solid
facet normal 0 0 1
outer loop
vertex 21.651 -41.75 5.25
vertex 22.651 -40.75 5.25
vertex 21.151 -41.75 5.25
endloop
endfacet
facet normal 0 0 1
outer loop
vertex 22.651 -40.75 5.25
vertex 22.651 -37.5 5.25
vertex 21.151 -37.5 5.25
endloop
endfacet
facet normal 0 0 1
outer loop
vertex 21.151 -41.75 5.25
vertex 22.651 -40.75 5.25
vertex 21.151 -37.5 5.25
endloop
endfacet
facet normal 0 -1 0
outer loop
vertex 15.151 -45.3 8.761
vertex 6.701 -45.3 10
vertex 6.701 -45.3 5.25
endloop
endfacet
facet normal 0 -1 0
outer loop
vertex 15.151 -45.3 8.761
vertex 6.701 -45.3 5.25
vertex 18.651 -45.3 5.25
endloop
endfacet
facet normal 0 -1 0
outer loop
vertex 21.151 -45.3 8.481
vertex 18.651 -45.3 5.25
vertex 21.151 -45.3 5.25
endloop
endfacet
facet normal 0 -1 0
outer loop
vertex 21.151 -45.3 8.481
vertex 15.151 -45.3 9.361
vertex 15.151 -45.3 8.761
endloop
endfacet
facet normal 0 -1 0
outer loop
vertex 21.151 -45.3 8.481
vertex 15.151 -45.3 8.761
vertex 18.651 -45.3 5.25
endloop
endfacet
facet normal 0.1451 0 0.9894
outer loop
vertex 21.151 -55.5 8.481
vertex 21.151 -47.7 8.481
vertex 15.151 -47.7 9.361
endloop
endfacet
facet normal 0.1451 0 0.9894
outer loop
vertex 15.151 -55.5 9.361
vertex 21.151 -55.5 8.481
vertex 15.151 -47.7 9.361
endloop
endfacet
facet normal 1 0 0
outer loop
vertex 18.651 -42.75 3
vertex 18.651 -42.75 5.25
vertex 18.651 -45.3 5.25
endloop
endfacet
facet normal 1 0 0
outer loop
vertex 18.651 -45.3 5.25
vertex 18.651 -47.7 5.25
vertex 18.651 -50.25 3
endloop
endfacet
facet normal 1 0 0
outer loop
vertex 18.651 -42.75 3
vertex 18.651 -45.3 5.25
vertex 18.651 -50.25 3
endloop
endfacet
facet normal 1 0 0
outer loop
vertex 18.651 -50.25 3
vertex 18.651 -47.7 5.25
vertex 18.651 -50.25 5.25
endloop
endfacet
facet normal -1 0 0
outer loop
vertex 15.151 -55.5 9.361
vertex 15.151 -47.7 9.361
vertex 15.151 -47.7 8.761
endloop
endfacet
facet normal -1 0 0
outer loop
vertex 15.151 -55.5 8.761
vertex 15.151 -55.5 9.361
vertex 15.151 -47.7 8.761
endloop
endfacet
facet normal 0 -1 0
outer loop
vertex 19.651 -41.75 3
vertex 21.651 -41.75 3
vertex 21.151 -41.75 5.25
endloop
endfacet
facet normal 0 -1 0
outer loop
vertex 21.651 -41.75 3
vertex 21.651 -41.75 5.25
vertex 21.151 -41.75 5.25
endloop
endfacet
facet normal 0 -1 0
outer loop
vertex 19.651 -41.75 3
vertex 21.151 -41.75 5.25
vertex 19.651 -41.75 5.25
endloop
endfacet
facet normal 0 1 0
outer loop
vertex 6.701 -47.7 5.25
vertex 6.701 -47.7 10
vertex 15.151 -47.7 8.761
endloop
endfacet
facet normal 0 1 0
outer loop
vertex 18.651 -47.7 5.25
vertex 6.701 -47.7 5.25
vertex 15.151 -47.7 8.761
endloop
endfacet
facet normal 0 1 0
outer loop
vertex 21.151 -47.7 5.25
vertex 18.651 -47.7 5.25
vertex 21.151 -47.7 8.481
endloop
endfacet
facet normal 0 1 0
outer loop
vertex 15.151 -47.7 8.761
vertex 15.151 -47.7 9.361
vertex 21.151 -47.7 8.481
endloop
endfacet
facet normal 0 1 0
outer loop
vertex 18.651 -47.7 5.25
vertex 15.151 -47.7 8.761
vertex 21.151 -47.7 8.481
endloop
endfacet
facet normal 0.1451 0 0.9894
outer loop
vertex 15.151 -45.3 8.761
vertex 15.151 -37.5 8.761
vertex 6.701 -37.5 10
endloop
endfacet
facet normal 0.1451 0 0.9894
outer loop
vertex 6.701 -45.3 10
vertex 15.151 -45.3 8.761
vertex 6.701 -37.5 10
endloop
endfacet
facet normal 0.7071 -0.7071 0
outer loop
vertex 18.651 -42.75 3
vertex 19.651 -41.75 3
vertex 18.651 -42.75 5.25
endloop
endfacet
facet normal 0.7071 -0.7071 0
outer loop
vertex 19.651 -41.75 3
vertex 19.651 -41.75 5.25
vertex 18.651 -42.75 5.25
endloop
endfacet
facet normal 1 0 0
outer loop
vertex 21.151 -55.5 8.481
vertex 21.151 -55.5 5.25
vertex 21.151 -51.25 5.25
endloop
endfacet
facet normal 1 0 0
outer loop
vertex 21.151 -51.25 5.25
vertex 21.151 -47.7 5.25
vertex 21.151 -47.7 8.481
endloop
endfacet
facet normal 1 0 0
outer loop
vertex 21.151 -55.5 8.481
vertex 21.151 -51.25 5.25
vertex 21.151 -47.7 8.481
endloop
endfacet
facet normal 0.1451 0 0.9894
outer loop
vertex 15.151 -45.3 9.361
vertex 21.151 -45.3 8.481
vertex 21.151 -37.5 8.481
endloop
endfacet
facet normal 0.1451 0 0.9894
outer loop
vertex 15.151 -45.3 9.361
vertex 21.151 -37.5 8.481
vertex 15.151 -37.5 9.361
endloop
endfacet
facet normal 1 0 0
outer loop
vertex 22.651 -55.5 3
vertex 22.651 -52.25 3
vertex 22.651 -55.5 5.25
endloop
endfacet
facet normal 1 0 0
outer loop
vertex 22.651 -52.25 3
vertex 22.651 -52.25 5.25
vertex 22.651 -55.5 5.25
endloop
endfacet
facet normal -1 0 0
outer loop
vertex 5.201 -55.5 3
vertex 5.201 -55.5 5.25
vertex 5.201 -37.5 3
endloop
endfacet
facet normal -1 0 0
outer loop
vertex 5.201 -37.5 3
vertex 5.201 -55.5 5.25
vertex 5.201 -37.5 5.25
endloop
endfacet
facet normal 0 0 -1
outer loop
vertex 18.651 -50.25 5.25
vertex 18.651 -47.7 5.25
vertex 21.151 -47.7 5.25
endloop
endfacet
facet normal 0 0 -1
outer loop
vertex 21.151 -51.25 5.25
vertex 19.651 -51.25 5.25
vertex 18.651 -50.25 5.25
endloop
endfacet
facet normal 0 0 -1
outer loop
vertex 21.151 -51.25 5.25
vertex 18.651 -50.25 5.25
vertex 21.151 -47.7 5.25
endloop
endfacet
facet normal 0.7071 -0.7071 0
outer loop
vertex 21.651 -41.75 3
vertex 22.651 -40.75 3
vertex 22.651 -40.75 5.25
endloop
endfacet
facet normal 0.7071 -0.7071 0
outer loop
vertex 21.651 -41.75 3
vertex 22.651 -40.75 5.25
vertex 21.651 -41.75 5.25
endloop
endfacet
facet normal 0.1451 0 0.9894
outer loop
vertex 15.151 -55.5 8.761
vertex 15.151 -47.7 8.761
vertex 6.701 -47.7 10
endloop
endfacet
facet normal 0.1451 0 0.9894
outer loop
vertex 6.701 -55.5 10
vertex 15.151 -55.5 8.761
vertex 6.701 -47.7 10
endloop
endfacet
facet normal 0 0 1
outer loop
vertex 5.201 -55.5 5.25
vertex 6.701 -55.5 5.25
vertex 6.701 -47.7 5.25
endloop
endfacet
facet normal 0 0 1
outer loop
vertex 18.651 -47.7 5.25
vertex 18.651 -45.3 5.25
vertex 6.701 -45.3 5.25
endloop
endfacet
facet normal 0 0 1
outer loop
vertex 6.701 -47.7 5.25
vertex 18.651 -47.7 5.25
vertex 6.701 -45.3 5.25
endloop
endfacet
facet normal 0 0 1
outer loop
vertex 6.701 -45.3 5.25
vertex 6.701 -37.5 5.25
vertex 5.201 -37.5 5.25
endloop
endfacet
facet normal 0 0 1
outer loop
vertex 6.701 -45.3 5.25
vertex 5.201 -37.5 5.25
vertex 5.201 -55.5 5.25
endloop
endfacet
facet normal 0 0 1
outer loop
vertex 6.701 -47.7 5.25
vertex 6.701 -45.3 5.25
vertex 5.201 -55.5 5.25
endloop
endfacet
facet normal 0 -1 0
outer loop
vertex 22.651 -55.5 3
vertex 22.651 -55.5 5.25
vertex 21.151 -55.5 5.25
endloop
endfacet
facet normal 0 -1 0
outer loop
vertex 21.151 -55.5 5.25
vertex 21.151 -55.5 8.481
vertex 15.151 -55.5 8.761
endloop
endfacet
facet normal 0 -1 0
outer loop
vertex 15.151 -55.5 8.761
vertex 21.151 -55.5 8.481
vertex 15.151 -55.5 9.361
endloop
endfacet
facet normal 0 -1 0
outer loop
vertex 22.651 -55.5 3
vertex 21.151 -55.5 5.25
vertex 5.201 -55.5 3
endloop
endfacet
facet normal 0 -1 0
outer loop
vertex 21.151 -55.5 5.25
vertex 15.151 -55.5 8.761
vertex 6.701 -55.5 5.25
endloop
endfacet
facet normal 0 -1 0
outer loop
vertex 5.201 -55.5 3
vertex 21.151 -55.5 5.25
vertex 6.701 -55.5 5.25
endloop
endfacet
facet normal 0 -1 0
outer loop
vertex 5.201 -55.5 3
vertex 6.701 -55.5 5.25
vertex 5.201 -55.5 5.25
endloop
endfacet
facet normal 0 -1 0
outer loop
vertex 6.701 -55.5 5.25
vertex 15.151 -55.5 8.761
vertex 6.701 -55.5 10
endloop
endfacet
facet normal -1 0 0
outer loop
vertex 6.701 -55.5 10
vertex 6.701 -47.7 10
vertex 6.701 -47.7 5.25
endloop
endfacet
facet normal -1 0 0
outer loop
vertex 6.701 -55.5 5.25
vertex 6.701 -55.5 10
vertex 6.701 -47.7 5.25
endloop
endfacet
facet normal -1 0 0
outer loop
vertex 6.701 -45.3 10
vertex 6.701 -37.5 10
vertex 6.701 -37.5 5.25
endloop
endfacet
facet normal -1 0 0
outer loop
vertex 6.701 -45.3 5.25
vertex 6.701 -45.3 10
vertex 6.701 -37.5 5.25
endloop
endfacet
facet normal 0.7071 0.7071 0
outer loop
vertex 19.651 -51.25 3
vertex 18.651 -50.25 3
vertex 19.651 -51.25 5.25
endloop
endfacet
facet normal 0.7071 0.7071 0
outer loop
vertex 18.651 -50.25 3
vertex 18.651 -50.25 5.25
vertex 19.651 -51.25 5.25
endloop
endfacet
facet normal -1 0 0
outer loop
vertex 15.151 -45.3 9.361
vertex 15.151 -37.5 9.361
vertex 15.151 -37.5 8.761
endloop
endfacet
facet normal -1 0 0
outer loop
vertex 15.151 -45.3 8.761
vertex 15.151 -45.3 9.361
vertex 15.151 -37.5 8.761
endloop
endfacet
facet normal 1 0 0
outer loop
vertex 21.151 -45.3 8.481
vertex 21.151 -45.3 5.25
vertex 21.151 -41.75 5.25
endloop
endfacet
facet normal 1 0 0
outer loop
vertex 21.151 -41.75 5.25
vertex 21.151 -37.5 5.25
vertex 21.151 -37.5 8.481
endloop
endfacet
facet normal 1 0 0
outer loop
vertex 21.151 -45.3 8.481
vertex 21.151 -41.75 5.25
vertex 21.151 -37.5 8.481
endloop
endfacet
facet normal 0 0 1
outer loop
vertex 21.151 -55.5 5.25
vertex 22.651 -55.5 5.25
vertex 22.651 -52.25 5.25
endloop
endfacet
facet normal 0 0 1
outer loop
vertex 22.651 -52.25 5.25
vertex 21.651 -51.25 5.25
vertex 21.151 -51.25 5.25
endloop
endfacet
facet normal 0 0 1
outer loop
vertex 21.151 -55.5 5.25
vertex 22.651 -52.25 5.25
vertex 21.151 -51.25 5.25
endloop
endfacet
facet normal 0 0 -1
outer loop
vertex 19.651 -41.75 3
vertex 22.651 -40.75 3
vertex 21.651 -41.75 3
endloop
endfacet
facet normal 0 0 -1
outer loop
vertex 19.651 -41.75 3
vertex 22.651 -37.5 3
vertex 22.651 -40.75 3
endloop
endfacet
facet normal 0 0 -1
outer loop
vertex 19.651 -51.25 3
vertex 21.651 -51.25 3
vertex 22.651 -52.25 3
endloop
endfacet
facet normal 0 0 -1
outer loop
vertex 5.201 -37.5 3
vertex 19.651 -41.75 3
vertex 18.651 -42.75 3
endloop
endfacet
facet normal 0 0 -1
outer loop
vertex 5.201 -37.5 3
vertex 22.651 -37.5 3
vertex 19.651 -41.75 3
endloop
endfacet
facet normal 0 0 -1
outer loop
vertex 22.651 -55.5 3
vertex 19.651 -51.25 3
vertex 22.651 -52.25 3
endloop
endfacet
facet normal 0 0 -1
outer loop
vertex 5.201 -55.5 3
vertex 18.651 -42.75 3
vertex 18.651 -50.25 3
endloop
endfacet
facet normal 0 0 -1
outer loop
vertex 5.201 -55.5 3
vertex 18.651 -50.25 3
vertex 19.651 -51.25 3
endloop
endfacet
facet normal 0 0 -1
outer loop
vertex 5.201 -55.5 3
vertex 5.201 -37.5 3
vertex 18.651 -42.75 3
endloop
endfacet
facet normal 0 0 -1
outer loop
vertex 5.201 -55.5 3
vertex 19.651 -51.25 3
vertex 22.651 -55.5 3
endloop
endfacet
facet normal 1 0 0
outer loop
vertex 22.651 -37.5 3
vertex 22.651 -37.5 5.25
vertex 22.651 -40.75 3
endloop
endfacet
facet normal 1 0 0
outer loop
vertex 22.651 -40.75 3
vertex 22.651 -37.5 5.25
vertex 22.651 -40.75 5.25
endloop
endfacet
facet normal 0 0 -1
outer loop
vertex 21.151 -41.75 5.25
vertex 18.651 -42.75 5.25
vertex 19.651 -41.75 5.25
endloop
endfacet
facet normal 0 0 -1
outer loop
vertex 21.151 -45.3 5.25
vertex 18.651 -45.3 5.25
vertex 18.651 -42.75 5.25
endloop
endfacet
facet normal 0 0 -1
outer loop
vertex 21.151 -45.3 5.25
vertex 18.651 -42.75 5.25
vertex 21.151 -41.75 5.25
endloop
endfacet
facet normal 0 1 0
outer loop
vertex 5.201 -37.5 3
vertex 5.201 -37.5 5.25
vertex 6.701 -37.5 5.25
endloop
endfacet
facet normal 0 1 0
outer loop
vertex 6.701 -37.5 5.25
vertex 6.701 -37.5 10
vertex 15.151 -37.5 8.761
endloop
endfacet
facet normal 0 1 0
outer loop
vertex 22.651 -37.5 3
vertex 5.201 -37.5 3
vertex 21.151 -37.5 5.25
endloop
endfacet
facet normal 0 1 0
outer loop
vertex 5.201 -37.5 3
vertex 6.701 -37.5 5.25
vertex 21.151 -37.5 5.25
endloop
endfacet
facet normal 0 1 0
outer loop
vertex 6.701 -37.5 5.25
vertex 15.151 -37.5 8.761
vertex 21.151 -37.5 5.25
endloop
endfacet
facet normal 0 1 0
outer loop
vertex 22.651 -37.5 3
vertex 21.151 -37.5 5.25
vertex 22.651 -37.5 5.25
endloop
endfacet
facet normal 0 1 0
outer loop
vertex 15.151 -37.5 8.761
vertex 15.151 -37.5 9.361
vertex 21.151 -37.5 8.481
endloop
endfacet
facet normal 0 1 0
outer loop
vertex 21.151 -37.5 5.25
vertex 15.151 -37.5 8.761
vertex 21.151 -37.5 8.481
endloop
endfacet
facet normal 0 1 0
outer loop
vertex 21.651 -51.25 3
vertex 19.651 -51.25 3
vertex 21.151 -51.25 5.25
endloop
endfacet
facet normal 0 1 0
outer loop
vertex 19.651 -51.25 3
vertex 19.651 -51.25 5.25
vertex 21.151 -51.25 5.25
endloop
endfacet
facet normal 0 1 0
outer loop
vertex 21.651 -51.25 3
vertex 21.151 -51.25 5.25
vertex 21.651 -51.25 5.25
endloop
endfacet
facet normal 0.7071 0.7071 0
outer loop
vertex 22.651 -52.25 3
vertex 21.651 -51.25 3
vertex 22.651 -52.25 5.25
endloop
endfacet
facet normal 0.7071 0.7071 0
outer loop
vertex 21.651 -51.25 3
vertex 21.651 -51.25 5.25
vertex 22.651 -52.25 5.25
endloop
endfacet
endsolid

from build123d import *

# Parameters (mm, degrees)
PAD010_DEPTH     = 18
SKETCH020_W      = 17.45
SKETCH020_H      = 2.4
POCKET011_DEPTH  = 6.75
SKETCH021_W      = 6
SKETCH021_H      = 6
PAD011_DEPTH     = 0.75
SKETCH022_W      = 4
SKETCH022_H      = 9.5
POCKET012_DEPTH  = 1
CHAMFER_SIZE     = 1
CHAMFER_FACE23_W = 6
CHAMFER_FACE23_H = 0.75
PAD012_DEPTH     = 12
PAD013_DEPTH     = 0.75
PAD014_DEPTH     = 0.5


with BuildPart() as part:
    # Sketch019 → Pad010 (new body)
    with BuildSketch(Plane.XZ):
        Polygon((21.151384, 8.480667), (15.151384, 9.360667), (15.151384, 8.760667), (6.701384, 10), (6.701384, 5.25), (5.201384, 5.25), (5.201384, 4.25), (22.651384, 4.25), (22.651384, 5.25), (21.151384, 5.25), align=None)
    extrude(amount=PAD010_DEPTH)

    # Sketch020 → Pocket011 (cut)
    with BuildSketch(Plane.XY.offset(12)):
        with Locations((13.926384, -9)):
            Rectangle(SKETCH020_W, SKETCH020_H)
    extrude(amount=-POCKET011_DEPTH, mode=Mode.SUBTRACT)

    # Sketch021 (on Face11 of Pocket011) → Pad011 (join)
    with BuildSketch(Plane(origin=(0, 0, 4.25), x_dir=(1, 0, 0), z_dir=(0, 0, -1))):
        with Locations((8.201384, 3)):
            Rectangle(SKETCH021_W, SKETCH021_H)
    extrude(amount=PAD011_DEPTH)

    # Sketch022 (on Face13 of Pad011) → Pocket012 (cut)
    with BuildSketch(Plane(origin=(0, 0, 4.25), x_dir=(1, 0, 0), z_dir=(0, 0, -1))):
        with Locations((20.651384, 9)):
            Rectangle(SKETCH022_W, SKETCH022_H)
    extrude(amount=-POCKET012_DEPTH, mode=Mode.SUBTRACT)

    # Chamfer
    chamfer_edges = [part.edges().sort_by_distance(p)[0] for p in [
        (18.651384, -4.25, 4.75),
        (18.651384, -13.75, 4.75),
        (22.651384, -4.25, 4.75),
        (22.651384, -13.75, 4.75),
    ]]
    chamfer(chamfer_edges, length=CHAMFER_SIZE)

    # Chamfer Face23 → Pad012 (add)
    with BuildSketch(Plane(origin=(8.201384, -6, 3.875), x_dir=(-1, 0, 0), z_dir=(0, -1, 0))):
        Rectangle(CHAMFER_FACE23_W, CHAMFER_FACE23_H)
    extrude(amount=PAD012_DEPTH)

    # Pad012 Face7 → Pad013 (add)
    with BuildSketch(Plane(origin=(16.064496, -9, 4.25), x_dir=(0, -1, 0), z_dir=(0, 0, -1))):
        Polygon((-5.75, -6.586888), (-4.75, -5.586888), (-4.75, -3.586888), (-3.75, -2.586888), (3.75, -2.586888), (4.75, -3.586888), (4.75, -5.586888), (5.75, -6.586888), (9, -6.586888), (9, 4.863112), (-9, 4.863112), (-9, -6.586888), align=None)
    extrude(amount=PAD013_DEPTH)

    # Pad013 Face25 → Pad014 (add)
    with BuildSketch(Plane(origin=(12.988741, -9, 3.5), x_dir=(0, -1, 0), z_dir=(0, 0, -1))):
        Polygon((-5.75, -9.662643), (-4.75, -8.662643), (-4.75, -6.662643), (-3.75, -5.662643), (3.75, -5.662643), (4.75, -6.662643), (4.75, -8.662643), (5.75, -9.662643), (9, -9.662643), (9, 7.787357), (-9, 7.787357), (-9, -9.662643), align=None)
    extrude(amount=PAD014_DEPTH)


with BuildPart() as part_1:
    # Body004 placement: moved
    add(part.part.moved(Location((0, -37.5, 0))))


solid = part_1.part
